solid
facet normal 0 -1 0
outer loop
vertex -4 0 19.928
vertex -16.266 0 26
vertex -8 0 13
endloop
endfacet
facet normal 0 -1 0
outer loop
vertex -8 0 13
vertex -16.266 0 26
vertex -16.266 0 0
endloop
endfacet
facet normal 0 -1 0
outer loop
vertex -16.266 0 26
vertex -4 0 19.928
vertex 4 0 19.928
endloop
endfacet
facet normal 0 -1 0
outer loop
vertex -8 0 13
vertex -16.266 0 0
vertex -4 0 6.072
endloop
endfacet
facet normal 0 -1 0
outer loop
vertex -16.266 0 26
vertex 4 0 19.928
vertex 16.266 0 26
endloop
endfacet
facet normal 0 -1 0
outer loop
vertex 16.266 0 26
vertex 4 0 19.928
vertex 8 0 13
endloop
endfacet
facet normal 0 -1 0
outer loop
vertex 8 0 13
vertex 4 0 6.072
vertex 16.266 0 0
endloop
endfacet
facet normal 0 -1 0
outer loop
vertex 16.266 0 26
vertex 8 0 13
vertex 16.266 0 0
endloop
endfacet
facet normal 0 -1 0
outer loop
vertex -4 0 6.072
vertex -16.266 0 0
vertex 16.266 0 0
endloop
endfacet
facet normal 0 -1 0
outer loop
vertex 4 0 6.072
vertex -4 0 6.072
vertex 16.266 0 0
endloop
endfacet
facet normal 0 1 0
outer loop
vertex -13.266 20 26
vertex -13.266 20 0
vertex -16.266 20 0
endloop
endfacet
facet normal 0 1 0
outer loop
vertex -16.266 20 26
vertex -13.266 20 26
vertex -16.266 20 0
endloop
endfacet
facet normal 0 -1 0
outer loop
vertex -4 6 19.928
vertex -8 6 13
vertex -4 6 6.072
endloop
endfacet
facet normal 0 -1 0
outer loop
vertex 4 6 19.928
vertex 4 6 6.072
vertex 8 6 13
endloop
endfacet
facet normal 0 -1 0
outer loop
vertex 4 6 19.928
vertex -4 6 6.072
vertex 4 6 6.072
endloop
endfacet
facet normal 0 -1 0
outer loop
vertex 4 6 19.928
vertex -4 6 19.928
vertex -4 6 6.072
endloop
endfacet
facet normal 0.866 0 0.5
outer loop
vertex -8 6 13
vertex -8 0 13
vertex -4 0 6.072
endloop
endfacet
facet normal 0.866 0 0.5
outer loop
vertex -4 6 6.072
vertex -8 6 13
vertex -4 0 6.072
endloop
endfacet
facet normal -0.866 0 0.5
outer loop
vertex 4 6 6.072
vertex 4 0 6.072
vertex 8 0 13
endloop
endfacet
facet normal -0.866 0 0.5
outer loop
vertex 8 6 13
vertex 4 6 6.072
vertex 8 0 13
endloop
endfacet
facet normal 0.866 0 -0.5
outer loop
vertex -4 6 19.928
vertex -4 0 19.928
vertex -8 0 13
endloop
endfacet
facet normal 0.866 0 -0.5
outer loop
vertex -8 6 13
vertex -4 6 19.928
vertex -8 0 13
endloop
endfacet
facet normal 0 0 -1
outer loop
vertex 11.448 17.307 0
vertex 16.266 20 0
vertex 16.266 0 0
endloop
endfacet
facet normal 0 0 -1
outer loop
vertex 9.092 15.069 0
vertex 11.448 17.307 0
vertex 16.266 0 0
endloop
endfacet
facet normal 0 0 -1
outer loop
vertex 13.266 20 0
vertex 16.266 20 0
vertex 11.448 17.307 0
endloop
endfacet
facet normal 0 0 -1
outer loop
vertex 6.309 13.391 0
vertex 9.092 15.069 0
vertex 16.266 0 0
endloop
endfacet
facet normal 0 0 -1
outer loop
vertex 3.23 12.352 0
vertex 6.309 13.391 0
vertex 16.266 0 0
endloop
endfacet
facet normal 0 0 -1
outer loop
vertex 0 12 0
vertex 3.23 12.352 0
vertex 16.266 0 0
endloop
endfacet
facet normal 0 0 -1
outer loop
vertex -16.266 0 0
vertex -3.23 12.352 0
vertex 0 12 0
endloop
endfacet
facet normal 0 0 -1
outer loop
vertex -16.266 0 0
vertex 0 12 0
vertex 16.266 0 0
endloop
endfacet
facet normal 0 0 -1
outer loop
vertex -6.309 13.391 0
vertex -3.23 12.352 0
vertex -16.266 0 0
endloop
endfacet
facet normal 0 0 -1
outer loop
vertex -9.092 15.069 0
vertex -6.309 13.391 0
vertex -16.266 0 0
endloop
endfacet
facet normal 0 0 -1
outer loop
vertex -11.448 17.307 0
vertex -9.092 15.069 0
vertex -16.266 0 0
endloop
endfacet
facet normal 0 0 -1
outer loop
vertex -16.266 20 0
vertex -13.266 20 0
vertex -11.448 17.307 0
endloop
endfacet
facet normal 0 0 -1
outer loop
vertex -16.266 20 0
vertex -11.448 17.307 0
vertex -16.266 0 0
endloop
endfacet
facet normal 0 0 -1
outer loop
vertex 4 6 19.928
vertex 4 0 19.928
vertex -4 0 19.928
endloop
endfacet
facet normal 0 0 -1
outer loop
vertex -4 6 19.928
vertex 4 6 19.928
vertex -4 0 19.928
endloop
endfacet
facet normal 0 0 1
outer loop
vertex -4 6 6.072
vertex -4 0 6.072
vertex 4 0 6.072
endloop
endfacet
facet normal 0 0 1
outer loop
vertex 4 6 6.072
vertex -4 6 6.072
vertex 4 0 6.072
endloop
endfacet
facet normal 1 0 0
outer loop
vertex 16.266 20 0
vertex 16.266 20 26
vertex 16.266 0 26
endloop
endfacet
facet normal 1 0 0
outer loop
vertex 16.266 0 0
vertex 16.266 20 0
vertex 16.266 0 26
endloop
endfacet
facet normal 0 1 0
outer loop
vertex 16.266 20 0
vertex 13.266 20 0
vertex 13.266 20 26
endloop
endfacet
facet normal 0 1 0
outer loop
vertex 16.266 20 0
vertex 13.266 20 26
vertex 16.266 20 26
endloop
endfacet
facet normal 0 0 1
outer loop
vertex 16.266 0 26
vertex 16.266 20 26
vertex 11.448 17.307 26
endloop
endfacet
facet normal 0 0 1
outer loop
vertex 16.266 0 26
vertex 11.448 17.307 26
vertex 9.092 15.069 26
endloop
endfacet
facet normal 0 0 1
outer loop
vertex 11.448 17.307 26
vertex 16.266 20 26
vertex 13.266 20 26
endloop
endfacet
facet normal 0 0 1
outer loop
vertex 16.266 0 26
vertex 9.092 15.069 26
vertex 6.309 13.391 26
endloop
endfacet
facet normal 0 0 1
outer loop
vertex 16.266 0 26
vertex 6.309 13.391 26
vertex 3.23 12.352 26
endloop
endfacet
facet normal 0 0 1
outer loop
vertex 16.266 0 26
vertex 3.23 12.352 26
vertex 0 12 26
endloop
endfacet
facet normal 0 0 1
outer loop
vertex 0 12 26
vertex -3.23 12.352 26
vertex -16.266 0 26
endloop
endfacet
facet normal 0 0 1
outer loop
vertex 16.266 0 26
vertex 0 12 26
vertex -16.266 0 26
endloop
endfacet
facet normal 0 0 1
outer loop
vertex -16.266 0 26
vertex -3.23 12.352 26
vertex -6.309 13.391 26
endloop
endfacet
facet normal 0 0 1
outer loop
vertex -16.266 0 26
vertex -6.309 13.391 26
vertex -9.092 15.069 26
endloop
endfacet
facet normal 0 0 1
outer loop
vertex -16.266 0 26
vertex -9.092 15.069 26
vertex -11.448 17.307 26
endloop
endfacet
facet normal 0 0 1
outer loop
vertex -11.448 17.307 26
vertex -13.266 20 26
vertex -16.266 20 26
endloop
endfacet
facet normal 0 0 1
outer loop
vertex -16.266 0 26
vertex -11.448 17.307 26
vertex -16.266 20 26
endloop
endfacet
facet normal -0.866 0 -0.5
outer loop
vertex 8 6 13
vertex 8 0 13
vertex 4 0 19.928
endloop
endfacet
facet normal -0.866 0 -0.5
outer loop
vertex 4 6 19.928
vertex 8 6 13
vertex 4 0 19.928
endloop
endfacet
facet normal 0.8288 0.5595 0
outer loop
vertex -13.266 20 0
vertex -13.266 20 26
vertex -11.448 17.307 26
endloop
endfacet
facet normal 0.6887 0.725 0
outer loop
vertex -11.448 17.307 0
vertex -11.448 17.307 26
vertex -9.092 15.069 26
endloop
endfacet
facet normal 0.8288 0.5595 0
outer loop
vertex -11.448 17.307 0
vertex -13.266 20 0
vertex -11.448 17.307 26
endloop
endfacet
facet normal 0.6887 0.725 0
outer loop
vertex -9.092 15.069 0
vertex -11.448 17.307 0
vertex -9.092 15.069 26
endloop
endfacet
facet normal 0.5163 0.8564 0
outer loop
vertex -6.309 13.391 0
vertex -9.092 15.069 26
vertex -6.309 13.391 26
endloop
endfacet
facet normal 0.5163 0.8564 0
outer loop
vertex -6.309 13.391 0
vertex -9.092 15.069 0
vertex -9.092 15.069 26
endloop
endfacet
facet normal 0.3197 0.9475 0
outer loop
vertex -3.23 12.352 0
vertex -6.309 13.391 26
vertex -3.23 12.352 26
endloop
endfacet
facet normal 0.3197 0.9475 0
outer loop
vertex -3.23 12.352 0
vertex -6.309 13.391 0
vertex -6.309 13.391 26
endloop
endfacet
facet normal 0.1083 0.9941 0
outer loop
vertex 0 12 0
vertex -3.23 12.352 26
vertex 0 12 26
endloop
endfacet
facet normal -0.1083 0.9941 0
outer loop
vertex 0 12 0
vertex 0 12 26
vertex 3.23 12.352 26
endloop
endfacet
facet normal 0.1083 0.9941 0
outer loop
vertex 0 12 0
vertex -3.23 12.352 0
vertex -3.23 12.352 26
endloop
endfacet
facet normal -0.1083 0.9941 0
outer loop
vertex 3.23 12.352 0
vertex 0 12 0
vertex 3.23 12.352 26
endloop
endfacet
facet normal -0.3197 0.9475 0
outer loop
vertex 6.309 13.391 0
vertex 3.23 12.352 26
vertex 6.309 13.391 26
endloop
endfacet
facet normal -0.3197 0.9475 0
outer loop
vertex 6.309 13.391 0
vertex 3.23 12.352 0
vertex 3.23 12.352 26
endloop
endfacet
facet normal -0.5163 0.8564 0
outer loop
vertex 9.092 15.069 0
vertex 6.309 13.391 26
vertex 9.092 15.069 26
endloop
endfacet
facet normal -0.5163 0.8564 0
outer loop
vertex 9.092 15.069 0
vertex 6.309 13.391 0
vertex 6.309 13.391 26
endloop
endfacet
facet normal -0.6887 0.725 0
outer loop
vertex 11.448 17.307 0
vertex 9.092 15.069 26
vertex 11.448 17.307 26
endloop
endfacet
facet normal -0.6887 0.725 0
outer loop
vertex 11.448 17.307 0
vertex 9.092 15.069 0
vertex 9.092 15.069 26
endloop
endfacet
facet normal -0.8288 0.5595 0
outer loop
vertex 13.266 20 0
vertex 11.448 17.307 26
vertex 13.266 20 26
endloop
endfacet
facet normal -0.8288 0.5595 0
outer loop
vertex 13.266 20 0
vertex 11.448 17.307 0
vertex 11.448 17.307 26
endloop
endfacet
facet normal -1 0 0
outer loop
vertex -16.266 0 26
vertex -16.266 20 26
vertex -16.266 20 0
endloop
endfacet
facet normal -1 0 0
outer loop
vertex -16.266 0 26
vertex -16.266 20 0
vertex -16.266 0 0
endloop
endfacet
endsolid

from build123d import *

# Parameters (mm, degrees)
PAD_DEPTH    = 26
POCKET_DEPTH = 6


with BuildPart() as part:
    # Sketch → Pad (new body)
    with BuildSketch(Plane.XY):
        with BuildLine():
            ThreePointArc((-13.266499, 20), (0, 12), (13.266499, 20))
            Line((13.266499, 20), (16.266499, 20))
            Line((16.266499, 20), (16.266499, 0))
            Line((-16.266499, 0), (16.266499, 0))
            Line((-16.266499, 20), (-16.266499, 0))
            Line((-13.266499, 20), (-16.266499, 20))
        make_face()
    extrude(amount=PAD_DEPTH)

    # Sketch001 → Pocket (cut)
    with BuildSketch(Plane.XZ):
        Polygon((4, 6.071797), (8, 13), (4, 19.928203), (-4, 19.928203), (-8, 13), (-4, 6.071797), align=None)
    extrude(amount=-POCKET_DEPTH, mode=Mode.SUBTRACT)


solid = part.part
